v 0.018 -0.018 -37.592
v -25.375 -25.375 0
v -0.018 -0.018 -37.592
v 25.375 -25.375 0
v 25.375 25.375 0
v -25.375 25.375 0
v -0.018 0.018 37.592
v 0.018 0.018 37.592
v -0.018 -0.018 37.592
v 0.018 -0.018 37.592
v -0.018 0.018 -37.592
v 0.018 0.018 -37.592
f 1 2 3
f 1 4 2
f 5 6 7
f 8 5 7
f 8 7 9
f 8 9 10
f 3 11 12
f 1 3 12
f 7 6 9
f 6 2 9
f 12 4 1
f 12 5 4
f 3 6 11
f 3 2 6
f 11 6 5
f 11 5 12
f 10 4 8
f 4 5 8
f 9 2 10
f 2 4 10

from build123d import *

# Parameters (mm, degrees)
F0_W     = 68.58
F0_H     = 68.58
F1_DEPTH = 50.8
F1_TAPER = 34
F2_SCALE = 0.74


with BuildPart() as f1:
    # F0 (on Top) → F1 (new body)
    with BuildSketch(Plane.XY):
        Rectangle(F0_W, F0_H)
    extrude(amount=F1_DEPTH, taper=F1_TAPER)


with BuildPart() as f1_1:
    # F2: moved
    add(f1.part.scale(F2_SCALE))

    # F3: F1 across plane


with BuildPart() as f1_2:
    add(f1_1.part)
    add(f1_1.part.mirror(Plane.XY))


solid = f1_2.part
